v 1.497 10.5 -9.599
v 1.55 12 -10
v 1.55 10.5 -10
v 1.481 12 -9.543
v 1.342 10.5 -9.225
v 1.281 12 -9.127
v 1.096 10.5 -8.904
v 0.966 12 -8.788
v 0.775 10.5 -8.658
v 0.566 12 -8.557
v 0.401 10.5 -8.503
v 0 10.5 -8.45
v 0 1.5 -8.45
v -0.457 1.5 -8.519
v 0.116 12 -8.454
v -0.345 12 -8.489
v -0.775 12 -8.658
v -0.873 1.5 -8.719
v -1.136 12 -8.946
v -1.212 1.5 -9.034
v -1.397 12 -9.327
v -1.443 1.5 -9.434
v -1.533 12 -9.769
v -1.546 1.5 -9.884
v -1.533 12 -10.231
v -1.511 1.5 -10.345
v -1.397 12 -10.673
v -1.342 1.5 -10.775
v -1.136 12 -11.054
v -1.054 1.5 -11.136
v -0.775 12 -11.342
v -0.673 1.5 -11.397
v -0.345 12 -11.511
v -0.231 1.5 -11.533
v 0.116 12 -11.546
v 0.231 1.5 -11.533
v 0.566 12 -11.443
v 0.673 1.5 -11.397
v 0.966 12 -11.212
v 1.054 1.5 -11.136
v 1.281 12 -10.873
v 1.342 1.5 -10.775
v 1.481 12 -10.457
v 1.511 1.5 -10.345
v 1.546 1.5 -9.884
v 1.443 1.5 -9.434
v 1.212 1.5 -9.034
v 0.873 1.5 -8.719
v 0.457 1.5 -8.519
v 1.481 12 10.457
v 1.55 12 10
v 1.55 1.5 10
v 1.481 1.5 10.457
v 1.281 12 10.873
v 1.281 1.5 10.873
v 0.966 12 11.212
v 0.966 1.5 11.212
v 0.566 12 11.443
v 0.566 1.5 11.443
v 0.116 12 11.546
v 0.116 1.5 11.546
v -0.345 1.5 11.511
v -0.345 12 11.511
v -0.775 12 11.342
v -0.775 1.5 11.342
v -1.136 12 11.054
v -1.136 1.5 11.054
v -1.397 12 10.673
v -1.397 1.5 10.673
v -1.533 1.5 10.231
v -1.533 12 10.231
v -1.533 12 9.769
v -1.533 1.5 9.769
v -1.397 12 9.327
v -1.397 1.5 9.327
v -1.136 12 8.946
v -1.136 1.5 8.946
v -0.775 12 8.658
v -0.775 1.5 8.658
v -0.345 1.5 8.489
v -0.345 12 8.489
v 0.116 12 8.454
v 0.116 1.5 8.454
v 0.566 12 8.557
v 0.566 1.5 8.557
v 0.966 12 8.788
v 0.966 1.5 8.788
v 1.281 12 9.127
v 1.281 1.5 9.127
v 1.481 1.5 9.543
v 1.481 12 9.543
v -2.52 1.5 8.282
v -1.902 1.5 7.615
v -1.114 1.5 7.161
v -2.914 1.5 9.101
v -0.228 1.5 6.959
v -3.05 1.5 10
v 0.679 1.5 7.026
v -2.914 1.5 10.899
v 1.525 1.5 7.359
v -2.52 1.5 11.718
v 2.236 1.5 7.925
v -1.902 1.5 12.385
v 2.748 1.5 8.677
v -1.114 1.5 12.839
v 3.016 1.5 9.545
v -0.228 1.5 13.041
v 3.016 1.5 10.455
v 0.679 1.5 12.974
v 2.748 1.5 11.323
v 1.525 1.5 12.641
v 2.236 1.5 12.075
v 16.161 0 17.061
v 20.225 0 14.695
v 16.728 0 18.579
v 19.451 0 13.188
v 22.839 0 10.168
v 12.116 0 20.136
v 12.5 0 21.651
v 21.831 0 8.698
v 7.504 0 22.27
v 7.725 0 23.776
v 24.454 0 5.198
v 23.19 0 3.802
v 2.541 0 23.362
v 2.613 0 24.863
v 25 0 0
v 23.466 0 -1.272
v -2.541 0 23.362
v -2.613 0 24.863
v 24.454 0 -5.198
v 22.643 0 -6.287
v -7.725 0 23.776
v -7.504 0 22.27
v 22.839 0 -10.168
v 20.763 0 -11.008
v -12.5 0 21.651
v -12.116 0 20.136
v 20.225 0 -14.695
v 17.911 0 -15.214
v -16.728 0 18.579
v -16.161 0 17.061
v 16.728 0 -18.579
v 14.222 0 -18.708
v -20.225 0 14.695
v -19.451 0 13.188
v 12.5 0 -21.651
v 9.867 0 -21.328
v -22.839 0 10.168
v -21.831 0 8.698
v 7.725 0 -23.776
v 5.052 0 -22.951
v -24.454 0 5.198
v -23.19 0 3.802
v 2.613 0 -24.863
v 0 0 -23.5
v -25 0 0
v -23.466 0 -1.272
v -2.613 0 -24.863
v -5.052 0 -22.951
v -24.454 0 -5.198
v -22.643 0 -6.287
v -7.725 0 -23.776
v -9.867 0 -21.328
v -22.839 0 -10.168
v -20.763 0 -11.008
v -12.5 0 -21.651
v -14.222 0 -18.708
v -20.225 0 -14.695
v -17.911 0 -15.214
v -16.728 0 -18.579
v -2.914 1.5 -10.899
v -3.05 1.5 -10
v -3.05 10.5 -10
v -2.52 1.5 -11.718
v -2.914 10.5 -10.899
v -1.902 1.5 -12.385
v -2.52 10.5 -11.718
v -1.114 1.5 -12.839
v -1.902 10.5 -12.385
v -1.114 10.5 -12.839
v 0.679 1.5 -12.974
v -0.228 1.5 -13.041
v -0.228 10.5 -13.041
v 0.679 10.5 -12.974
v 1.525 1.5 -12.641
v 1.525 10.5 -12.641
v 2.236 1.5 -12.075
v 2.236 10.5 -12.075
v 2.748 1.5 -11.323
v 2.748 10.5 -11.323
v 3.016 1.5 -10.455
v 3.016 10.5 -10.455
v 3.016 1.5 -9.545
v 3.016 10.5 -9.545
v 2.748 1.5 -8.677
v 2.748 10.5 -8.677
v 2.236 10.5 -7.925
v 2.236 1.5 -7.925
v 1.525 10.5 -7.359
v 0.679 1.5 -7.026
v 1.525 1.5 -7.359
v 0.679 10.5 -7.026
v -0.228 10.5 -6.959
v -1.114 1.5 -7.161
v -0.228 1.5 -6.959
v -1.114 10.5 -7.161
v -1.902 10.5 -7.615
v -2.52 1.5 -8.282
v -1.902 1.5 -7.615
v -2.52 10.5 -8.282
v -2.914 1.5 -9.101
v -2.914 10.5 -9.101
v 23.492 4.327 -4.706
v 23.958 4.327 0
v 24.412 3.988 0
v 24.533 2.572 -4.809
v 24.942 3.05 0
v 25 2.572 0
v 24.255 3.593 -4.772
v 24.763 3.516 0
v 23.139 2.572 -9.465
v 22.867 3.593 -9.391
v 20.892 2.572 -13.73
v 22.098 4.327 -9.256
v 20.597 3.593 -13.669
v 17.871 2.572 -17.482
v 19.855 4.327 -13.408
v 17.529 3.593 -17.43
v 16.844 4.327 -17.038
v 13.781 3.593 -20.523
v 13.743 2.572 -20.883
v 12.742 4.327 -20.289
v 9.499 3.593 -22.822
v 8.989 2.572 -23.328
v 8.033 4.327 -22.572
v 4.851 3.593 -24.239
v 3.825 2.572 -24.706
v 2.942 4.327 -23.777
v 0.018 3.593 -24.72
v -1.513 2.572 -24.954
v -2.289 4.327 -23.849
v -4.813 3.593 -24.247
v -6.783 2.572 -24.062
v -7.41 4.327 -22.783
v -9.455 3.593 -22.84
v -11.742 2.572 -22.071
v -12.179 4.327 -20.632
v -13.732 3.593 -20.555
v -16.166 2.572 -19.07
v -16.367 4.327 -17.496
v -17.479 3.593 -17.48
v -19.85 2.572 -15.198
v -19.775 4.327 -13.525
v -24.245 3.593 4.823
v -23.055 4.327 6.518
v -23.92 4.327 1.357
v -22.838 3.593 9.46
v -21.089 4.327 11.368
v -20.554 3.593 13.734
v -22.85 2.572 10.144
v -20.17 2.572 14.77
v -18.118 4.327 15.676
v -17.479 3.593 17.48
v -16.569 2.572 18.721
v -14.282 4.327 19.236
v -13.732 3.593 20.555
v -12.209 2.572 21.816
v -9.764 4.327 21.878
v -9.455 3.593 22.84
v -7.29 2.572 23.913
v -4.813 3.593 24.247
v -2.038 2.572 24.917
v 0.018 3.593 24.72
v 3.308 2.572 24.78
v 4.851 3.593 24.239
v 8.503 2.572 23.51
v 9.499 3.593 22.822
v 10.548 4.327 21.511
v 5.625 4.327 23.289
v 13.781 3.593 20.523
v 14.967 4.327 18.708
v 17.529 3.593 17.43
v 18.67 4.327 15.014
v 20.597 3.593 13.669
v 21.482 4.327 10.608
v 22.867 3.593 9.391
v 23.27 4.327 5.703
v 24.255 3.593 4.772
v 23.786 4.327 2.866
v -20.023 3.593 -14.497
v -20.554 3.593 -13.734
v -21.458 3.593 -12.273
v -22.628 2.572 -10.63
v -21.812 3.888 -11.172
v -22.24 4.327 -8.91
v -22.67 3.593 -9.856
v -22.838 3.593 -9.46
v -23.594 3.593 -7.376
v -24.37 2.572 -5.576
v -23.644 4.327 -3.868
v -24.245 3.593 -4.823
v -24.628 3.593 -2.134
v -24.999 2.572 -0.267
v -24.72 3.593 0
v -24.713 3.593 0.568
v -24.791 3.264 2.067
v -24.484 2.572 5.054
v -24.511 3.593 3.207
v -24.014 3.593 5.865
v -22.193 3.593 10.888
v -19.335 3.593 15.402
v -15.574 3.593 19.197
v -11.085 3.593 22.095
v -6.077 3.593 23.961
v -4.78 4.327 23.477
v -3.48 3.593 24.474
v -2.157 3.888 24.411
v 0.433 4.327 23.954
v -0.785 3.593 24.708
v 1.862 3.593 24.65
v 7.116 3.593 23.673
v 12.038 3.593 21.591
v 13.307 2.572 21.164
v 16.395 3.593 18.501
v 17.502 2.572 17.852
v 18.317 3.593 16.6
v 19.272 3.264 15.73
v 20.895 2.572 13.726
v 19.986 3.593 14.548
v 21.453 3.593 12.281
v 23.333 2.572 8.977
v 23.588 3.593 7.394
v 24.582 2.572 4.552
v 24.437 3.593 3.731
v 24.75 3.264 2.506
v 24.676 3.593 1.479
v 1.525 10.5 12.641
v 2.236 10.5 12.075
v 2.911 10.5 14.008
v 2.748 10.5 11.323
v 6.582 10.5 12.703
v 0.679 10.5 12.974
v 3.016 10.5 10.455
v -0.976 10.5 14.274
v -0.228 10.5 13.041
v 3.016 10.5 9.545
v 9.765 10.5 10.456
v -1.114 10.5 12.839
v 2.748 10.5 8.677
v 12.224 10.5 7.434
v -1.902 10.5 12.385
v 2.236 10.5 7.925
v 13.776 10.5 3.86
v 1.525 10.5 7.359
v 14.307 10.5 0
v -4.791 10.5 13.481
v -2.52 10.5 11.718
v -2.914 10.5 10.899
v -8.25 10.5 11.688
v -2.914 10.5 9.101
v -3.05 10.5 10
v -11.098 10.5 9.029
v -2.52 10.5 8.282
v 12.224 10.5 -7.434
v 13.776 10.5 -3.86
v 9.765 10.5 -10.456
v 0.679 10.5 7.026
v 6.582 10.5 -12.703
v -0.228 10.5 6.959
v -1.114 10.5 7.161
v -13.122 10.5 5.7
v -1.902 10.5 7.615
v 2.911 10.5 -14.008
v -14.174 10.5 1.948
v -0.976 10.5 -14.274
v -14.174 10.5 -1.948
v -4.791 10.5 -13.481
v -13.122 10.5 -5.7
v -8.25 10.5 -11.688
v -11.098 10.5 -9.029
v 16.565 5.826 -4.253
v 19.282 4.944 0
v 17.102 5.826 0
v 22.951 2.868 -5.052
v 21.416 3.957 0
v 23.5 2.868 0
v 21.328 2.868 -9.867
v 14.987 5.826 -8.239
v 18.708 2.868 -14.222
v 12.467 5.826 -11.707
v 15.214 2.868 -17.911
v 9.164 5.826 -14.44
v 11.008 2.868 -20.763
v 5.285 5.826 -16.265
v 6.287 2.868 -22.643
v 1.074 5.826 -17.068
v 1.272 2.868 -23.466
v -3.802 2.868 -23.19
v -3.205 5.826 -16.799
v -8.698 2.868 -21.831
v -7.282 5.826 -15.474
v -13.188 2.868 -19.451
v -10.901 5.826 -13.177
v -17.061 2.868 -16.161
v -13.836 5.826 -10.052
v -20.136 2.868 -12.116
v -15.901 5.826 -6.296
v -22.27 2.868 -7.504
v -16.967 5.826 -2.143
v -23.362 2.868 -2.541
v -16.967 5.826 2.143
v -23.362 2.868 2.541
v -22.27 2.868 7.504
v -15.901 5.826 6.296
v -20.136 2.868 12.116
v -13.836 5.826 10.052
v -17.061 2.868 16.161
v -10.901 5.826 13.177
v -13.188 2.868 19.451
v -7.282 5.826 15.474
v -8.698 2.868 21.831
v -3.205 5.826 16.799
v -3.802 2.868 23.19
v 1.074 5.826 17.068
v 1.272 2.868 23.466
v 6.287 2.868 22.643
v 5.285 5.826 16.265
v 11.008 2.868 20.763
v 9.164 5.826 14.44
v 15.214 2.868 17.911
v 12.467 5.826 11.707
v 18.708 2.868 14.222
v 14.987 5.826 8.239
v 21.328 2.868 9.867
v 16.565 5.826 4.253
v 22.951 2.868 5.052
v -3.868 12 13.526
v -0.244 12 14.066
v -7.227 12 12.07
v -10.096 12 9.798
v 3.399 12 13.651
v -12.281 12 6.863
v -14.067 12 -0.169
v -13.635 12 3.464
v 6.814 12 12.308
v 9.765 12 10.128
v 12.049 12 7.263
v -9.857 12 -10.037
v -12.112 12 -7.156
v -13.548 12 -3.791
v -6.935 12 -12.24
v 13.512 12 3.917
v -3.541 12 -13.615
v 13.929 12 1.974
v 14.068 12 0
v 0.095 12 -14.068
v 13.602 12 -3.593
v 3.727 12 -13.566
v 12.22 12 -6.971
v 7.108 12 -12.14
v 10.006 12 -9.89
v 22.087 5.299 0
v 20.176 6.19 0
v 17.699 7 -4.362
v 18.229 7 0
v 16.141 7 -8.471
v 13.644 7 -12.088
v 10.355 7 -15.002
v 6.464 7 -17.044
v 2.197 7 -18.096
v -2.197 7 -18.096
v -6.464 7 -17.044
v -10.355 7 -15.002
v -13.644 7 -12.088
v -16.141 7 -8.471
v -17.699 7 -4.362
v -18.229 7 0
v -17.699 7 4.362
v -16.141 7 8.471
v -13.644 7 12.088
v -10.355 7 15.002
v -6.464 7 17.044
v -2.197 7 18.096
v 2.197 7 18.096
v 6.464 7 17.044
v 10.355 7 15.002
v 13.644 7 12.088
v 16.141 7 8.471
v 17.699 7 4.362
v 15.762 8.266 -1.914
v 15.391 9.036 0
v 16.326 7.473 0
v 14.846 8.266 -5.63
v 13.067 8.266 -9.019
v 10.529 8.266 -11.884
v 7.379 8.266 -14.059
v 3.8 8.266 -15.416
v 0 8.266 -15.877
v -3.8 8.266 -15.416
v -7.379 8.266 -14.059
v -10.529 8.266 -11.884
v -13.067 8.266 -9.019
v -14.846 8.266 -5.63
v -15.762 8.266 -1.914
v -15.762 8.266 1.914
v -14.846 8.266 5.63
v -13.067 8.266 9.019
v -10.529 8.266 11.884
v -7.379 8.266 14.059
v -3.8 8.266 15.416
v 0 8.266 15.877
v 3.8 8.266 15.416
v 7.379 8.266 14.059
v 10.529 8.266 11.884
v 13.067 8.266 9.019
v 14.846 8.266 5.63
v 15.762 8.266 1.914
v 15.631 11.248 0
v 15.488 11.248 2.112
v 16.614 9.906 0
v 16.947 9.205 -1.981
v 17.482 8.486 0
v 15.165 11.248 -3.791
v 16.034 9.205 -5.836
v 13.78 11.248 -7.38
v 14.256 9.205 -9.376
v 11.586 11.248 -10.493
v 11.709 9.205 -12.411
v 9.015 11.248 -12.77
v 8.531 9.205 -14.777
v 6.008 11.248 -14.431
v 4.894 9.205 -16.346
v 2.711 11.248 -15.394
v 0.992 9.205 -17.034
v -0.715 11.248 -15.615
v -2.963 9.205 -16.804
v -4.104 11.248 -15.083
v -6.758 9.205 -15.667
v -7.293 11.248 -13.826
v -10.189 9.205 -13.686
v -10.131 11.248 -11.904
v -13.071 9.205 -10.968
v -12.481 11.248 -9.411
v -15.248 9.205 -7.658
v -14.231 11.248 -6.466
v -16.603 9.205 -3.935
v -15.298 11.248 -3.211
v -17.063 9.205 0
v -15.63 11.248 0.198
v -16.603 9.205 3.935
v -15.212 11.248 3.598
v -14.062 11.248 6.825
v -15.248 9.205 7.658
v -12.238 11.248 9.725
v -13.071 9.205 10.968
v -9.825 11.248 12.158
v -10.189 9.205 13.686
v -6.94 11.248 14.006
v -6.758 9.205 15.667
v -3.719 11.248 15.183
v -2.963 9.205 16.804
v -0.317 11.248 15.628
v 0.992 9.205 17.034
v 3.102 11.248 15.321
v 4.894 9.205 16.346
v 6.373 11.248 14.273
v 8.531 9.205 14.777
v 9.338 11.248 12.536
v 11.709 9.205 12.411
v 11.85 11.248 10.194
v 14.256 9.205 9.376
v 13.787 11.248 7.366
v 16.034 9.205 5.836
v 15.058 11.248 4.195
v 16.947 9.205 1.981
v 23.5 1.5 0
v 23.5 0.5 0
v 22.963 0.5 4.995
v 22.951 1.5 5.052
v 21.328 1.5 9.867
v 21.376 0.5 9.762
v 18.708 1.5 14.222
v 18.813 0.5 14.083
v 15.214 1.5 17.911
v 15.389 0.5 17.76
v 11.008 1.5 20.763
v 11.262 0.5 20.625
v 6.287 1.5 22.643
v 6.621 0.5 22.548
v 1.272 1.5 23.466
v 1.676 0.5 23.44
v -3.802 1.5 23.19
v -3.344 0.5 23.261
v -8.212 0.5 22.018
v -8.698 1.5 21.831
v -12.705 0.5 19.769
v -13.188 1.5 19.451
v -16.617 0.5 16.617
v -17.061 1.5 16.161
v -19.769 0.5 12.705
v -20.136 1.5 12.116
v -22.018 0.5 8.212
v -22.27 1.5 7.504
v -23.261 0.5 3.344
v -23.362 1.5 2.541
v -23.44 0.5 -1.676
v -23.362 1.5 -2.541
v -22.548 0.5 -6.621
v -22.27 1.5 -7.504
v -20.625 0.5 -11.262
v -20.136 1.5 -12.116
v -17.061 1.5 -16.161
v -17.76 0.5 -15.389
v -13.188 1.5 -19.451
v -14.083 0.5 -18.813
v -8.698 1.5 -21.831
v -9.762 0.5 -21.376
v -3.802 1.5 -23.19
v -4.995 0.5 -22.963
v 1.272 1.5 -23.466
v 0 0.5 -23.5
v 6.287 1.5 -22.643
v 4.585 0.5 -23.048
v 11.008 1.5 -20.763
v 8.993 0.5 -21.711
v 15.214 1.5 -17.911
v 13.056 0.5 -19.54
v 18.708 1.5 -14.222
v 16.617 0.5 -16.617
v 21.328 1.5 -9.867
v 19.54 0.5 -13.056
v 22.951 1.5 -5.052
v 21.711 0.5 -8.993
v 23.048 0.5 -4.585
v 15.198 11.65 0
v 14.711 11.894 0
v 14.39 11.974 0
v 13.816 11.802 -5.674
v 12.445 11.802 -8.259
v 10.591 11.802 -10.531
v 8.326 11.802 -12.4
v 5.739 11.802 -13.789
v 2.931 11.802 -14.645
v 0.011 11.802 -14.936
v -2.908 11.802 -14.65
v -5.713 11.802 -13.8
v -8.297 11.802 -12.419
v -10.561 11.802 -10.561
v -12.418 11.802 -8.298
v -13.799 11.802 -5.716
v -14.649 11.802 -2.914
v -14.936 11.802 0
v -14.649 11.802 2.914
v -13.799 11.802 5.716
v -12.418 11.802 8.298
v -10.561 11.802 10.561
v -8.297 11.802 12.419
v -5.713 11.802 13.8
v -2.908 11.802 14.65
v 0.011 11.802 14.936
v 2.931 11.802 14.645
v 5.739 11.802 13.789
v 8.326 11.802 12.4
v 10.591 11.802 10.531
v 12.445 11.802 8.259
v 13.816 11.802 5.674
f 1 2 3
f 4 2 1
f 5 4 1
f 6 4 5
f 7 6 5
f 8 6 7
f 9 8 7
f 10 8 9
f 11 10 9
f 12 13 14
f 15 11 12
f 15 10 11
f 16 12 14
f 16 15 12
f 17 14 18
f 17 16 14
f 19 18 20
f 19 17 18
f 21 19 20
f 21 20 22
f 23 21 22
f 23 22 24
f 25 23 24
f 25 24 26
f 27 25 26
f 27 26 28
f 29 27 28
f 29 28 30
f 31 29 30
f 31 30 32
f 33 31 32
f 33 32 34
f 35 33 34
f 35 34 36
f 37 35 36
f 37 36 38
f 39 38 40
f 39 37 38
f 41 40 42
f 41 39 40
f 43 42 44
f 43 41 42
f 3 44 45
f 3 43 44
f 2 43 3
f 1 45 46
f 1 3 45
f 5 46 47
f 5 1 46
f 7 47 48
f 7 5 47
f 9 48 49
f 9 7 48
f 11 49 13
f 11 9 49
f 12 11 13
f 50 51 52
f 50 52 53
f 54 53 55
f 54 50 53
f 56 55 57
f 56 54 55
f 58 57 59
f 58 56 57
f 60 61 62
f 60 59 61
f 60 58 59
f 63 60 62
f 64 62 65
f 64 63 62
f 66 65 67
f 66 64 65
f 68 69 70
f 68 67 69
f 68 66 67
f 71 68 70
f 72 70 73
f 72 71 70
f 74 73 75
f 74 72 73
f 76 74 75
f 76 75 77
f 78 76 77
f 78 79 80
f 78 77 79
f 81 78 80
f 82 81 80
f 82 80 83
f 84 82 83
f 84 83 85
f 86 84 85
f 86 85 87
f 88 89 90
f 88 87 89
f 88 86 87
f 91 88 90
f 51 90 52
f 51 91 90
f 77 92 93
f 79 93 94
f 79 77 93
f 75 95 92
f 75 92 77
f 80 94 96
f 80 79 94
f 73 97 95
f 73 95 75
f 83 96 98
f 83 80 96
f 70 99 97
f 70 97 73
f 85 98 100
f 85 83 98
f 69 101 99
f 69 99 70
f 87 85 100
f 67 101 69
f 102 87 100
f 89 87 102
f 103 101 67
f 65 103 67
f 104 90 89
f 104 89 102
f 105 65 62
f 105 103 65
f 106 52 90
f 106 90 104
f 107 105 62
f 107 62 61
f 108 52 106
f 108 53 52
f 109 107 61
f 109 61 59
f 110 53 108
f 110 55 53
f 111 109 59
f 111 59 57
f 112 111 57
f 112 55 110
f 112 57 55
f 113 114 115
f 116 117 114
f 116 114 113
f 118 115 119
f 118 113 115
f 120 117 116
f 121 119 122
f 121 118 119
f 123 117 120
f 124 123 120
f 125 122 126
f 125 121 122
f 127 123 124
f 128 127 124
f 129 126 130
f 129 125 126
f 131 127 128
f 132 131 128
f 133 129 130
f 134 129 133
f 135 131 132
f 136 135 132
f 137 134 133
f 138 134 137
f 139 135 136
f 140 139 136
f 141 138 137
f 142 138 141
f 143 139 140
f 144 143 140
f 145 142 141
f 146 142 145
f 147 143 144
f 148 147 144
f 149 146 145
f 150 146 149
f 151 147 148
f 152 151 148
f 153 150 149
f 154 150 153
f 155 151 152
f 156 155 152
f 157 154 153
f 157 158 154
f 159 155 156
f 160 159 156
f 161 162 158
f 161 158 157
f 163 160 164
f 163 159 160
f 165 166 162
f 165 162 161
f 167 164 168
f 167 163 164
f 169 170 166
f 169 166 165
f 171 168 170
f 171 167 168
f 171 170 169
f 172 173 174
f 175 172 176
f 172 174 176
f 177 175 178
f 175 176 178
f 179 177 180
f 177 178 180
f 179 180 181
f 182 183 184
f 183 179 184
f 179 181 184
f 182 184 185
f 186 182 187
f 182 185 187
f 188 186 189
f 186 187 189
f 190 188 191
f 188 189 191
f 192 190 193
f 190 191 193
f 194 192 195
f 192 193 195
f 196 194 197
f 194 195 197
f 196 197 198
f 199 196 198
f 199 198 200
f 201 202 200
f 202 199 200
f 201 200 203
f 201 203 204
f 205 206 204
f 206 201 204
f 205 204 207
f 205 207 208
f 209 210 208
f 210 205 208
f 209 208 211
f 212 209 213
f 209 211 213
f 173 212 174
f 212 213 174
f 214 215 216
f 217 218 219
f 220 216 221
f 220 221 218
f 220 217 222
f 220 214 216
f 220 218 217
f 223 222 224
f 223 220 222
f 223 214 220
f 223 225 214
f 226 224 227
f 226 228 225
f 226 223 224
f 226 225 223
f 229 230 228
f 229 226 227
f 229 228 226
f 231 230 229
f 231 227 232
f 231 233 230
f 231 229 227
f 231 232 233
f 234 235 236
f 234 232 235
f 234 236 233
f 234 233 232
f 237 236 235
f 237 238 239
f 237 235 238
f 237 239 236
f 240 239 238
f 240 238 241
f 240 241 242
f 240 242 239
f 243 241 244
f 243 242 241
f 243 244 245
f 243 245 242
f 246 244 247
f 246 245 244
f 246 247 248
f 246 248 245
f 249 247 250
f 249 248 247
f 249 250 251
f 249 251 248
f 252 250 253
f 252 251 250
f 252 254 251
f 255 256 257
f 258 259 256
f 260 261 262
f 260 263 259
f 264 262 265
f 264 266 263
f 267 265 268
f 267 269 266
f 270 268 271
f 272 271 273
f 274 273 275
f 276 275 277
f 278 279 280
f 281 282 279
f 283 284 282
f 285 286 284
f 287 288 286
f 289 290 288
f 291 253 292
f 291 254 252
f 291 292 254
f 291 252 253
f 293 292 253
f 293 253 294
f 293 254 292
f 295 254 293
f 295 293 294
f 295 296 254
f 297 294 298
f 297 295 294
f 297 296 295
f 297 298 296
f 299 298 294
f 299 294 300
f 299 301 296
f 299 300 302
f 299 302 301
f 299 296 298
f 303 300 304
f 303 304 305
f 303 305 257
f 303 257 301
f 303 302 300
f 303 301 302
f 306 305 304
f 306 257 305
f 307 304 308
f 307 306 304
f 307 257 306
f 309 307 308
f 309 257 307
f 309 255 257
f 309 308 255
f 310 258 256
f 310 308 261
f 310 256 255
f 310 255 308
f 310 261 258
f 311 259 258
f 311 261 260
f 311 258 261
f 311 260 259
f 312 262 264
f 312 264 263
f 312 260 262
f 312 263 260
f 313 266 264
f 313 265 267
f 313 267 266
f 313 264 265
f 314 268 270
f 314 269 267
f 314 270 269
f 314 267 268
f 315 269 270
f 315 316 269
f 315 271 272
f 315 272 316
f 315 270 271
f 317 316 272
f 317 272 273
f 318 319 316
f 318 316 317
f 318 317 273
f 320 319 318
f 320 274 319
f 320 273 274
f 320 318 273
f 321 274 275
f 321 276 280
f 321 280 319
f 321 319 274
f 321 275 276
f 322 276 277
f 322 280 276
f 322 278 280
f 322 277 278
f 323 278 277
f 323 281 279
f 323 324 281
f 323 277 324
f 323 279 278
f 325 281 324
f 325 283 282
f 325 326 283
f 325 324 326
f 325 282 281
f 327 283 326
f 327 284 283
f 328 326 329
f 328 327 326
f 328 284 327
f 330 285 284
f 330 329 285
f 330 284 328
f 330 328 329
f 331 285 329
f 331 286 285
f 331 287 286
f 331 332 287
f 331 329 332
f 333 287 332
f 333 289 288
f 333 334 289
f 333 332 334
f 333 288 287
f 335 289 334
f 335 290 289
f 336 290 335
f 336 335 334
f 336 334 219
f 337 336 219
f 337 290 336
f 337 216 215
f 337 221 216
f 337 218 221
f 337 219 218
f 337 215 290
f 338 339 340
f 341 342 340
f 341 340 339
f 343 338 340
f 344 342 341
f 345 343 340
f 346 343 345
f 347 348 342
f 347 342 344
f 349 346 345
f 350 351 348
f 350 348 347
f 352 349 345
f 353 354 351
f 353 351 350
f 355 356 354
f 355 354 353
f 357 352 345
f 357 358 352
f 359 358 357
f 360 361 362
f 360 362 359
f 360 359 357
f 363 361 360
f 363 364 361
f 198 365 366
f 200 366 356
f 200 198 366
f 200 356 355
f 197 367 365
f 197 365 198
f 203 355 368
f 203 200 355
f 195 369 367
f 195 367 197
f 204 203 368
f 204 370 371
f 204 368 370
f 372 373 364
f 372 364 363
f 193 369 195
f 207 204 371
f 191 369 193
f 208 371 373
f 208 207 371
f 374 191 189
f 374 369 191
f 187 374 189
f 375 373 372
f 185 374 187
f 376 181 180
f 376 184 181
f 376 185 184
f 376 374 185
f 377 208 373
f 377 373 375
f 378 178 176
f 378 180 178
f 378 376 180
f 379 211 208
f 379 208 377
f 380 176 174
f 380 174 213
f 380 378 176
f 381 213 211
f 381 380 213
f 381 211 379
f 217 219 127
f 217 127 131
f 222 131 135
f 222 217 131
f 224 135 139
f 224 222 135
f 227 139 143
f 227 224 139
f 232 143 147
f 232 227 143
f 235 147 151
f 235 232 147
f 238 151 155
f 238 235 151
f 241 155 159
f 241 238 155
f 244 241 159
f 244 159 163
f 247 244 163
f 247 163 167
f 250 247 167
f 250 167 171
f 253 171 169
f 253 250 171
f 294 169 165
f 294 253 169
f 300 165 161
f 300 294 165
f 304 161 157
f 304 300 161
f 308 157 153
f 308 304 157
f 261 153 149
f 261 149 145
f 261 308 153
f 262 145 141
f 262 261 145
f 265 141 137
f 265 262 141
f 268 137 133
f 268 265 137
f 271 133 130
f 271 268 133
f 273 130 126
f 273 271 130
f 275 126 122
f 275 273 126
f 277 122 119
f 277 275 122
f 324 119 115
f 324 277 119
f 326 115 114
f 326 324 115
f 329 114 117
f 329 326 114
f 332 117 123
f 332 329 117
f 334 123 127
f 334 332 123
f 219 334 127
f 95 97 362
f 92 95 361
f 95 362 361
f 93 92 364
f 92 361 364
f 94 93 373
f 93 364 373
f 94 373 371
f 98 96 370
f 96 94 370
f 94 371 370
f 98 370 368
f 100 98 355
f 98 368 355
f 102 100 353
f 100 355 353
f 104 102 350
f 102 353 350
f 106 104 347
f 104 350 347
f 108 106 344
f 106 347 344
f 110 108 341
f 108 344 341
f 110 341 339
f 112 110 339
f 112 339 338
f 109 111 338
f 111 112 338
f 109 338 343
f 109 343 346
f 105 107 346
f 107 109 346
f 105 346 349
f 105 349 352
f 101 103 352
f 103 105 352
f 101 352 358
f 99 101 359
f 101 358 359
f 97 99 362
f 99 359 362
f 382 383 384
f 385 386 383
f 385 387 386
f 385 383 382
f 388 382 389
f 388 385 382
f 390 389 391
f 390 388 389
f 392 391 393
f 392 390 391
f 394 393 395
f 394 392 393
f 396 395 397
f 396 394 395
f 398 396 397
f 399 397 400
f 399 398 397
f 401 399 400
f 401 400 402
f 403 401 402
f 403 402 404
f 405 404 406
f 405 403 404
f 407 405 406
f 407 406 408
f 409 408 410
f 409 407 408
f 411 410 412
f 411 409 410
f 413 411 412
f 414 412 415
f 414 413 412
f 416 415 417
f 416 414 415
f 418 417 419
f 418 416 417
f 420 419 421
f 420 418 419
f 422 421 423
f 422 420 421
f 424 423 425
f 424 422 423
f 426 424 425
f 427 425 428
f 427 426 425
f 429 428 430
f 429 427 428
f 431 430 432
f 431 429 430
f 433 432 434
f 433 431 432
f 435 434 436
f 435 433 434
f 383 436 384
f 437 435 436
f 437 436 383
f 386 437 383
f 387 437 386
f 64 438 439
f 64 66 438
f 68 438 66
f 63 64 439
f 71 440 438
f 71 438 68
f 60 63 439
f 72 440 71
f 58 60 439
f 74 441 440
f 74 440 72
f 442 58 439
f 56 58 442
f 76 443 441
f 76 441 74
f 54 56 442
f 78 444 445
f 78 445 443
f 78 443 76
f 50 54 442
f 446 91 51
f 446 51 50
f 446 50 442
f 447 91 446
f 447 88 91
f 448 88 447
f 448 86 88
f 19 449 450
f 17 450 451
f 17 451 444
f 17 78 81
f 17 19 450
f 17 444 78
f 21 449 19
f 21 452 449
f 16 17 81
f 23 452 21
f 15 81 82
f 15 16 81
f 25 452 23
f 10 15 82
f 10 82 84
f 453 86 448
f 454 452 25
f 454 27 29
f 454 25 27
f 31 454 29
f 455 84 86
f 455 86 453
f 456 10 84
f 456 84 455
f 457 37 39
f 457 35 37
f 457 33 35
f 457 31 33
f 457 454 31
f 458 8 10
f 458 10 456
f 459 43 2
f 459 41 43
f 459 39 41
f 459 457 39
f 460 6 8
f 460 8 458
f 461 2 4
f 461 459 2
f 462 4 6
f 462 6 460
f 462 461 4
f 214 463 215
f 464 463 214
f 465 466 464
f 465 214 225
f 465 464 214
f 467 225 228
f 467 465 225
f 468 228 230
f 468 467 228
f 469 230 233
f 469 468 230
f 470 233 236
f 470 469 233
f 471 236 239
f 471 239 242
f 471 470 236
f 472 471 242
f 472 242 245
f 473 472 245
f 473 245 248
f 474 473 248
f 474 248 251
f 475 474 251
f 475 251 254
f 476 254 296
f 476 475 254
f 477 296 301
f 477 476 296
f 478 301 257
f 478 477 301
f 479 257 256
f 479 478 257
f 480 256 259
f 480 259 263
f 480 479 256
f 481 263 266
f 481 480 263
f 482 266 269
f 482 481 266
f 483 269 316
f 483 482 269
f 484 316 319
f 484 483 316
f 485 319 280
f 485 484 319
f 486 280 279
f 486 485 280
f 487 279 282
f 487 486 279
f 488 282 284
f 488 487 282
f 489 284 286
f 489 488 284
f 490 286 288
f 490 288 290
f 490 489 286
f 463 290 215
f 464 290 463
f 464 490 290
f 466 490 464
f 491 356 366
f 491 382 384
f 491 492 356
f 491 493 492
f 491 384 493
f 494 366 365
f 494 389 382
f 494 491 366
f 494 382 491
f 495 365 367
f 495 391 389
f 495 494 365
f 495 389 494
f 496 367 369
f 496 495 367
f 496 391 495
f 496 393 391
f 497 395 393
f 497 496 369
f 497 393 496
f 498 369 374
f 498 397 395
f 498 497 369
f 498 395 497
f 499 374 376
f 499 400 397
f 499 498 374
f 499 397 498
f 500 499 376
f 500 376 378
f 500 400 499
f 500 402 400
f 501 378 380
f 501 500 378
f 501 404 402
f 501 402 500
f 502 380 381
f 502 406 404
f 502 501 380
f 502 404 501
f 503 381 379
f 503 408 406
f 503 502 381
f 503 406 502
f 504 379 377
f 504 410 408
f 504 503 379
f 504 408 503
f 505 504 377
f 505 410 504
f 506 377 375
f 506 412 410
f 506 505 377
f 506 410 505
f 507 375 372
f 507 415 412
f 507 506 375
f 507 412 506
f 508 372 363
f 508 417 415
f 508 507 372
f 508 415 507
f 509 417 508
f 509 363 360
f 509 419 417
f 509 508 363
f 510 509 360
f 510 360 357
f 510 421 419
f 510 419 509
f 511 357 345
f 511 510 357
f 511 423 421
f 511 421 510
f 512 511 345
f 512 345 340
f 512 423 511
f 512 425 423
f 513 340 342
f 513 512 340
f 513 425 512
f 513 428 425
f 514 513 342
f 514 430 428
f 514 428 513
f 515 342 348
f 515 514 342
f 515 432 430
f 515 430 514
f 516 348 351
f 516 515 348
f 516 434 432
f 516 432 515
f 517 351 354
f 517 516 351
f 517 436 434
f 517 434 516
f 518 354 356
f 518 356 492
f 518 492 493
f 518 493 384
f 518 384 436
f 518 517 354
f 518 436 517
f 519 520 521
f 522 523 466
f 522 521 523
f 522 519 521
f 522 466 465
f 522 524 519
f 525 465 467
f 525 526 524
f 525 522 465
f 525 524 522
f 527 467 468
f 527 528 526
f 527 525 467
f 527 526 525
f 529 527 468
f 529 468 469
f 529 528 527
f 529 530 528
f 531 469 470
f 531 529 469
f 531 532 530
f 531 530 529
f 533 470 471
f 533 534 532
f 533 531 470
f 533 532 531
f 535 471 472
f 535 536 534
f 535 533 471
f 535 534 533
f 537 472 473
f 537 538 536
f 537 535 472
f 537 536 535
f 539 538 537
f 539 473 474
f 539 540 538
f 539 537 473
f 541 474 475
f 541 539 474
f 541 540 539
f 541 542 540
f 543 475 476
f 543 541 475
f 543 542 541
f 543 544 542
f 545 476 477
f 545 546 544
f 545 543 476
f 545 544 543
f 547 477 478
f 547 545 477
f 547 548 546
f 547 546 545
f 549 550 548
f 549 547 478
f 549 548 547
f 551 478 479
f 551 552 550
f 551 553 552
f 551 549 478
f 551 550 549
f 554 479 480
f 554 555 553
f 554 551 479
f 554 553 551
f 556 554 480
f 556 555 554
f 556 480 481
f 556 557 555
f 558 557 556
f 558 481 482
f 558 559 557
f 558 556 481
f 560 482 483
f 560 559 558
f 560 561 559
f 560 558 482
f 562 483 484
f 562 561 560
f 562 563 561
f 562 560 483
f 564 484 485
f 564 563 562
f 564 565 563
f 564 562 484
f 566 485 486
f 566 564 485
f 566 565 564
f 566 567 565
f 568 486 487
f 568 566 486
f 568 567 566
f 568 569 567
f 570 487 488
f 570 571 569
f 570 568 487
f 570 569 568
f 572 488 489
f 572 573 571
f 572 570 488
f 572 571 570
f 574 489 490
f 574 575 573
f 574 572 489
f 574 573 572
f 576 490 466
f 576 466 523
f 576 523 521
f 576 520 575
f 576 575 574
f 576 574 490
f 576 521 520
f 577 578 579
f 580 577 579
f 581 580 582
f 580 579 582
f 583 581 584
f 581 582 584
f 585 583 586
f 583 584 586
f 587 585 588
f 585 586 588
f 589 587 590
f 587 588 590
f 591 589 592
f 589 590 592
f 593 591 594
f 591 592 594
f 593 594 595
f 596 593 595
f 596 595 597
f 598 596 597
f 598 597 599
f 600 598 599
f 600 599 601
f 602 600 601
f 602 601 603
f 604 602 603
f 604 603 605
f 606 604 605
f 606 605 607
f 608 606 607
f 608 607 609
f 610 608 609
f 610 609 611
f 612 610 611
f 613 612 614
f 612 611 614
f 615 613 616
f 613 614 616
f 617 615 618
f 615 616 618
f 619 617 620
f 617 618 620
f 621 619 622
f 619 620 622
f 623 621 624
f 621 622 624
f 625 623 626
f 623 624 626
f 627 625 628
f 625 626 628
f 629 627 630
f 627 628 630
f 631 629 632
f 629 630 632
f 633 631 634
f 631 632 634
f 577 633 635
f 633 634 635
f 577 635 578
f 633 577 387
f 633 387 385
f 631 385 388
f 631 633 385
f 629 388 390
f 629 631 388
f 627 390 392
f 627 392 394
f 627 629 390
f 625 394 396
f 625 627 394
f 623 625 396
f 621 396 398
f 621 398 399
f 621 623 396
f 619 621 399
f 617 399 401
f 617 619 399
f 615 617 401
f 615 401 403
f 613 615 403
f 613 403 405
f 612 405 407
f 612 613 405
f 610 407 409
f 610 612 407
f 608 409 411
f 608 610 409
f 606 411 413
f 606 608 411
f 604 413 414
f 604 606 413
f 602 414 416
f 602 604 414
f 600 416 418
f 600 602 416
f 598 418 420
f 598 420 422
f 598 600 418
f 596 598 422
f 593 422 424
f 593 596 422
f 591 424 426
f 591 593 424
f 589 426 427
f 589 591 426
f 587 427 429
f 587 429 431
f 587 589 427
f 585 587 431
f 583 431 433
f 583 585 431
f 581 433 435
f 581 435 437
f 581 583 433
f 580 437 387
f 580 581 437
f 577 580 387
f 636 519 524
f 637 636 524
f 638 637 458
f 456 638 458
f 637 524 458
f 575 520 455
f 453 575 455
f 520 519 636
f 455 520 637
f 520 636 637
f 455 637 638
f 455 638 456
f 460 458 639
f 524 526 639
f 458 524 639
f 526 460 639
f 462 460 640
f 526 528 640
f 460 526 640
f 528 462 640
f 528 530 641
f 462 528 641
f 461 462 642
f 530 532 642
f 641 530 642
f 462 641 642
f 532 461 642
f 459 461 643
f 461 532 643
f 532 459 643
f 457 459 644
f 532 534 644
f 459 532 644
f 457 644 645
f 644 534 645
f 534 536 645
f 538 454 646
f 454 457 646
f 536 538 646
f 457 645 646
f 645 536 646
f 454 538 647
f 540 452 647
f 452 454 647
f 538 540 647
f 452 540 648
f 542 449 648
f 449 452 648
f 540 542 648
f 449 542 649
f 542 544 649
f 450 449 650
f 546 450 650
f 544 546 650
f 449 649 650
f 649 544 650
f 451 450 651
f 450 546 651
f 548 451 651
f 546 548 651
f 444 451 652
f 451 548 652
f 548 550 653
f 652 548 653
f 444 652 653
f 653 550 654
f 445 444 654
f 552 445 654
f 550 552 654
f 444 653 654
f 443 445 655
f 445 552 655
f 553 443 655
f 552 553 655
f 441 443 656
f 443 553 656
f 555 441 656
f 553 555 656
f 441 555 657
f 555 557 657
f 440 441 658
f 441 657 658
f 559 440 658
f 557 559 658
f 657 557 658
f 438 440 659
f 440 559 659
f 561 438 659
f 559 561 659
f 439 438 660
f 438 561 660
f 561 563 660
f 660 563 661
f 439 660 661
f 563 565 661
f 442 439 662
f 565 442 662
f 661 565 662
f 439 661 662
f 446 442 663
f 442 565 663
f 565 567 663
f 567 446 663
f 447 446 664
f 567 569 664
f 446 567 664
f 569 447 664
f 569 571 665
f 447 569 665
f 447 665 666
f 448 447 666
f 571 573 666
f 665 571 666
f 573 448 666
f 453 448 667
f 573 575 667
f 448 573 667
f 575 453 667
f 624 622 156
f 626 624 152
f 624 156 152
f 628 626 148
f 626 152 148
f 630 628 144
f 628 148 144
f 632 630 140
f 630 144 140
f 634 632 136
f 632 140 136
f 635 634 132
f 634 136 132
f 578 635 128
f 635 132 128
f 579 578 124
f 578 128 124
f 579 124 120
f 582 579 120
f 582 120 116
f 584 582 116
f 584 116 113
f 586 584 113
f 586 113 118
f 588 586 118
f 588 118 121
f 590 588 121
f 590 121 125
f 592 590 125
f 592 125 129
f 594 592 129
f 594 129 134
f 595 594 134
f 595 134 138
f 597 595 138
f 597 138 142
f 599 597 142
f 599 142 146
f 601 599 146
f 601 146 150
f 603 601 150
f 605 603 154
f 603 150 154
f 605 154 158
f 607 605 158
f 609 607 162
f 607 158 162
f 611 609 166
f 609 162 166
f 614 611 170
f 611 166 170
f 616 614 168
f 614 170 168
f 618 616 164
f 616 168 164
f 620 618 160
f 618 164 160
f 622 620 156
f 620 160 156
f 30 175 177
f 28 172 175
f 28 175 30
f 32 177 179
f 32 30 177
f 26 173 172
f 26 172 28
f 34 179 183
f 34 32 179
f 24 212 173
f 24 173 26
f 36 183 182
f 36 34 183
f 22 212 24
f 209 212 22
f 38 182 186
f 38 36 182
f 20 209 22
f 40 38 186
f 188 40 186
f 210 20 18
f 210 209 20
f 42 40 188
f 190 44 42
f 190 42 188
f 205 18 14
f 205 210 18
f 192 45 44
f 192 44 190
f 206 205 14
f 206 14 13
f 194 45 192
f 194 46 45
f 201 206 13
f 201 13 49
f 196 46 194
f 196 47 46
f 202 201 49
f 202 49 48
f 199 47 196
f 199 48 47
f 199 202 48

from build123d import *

# Parameters (mm, degrees)
CROQUIS6_R              = 23.5
CORTAR_EXTRUIR2_DEPTH   = 0.5
CROQUIS7_R              = 3.05
CROQUIS7_R_2            = 1.55
SALIENTE_EXTRUIR1_DEPTH = 9.5
CORTAR_EXTRUIR3_START   = -5.5
CROQUIS8_R              = 1.55
CORTAR_EXTRUIR3_DEPTH   = 5.5
REDONDEO1_R             = 2
REDONDEO2_R             = 2
CROQUIS9_R              = 23.5
CORTAR_EXTRUIR4_DEPTH   = 1


with BuildPart() as part:
    # Croquis3 → Revolución1 (revolve)
    with BuildSketch(Plane.XY):
        with BuildLine():
            Line((25, 0), (25, 3.742571384))
            ThreePointArc((25, 3.742571384), (21.675655898, 5.498663982), (18.228756555, 7))
            ThreePointArc((18.228756555, 7), (16.801415582, 9.620779584), (15, 12))
            Line((15, 12), (0, 12))
            Line((0, 12), (0, 0))
            Line((0, 0), (25, 0))
        make_face()
    revolve(axis=Axis((0, 0, 0), (0, 1, 0)))

    # Croquis4 → Cortar-Revolución1 (revolve, cut)
    with BuildSketch(Plane.XY):
        with BuildLine():
            Line((0, 1.5), (0, 10.5))
            Line((0, 10.5), (14.30686093, 10.5))
            ThreePointArc((14.30686093, 10.5), (15.877398251, 8.266411941), (17.102065618, 5.825983099))
            ThreePointArc((17.102065618, 5.825983099), (20.35484662, 4.463230038), (23.5, 2.867708066))
            Line((23.5, 2.867708066), (23.5, 1.5))
            Line((23.5, 1.5), (0, 1.5))
        make_face()
    revolve(axis=Axis((0, 10.5, 0), (0, 1, 0)), mode=Mode.SUBTRACT)

    # Croquis6 → Cortar-Extruir2 (cut)
    with BuildSketch(Plane.XZ):
        with Locations(Location((0, 0, 0), (0, 0, 270))):
            Circle(CROQUIS6_R)
    extrude(amount=-CORTAR_EXTRUIR2_DEPTH, mode=Mode.SUBTRACT)

    # Croquis7 → Saliente-Extruir1 (add)
    # profile 1 of 2: a face of its own
    with BuildSketch(Plane.XZ.offset(-10.5)):
        with Locations(Location((0, 10, 0), (0, 0, 180))):
            Circle(CROQUIS7_R)
        with Locations((0, 10)):
            Circle(CROQUIS7_R_2, mode=Mode.SUBTRACT)
    # profile 2 of 2: a face of its own
    with BuildSketch(Plane.XZ.offset(-10.5)):
        with Locations(Location((0, -10, 0), (0, 0, 180))):
            Circle(CROQUIS7_R)
        with Locations(Location((0, -10, 0), (0, 0, 90))):
            Circle(CROQUIS7_R_2, mode=Mode.SUBTRACT)
    extrude(amount=SALIENTE_EXTRUIR1_DEPTH)

    # Croquis8 → Cortar-Extruir3 (cut)
    with BuildSketch(Plane.XZ.offset(-10.5).offset(CORTAR_EXTRUIR3_START)):
        with Locations((0, -10)):
            Circle(CROQUIS8_R)
        with Locations((0, 10)):
            Circle(CROQUIS8_R)
    extrude(amount=CORTAR_EXTRUIR3_DEPTH, mode=Mode.SUBTRACT)

    # Redondeo1
    redondeo1_edges = [part.edges().sort_by_distance(p)[0] for p in [
        (-15, 12, 0),
    ]]
    fillet(redondeo1_edges, radius=REDONDEO1_R)

    # Redondeo2
    redondeo2_edges = [part.edges().sort_by_distance(p)[0] for p in [
        (-25, 3.742571384, 0),
    ]]
    fillet(redondeo2_edges, radius=REDONDEO2_R)

    # Croquis9 → Cortar-Extruir4 (cut)
    with BuildSketch(Plane.XZ.offset(-0.5)):
        Circle(CROQUIS9_R)
    extrude(amount=-CORTAR_EXTRUIR4_DEPTH, mode=Mode.SUBTRACT)


solid = part.part
